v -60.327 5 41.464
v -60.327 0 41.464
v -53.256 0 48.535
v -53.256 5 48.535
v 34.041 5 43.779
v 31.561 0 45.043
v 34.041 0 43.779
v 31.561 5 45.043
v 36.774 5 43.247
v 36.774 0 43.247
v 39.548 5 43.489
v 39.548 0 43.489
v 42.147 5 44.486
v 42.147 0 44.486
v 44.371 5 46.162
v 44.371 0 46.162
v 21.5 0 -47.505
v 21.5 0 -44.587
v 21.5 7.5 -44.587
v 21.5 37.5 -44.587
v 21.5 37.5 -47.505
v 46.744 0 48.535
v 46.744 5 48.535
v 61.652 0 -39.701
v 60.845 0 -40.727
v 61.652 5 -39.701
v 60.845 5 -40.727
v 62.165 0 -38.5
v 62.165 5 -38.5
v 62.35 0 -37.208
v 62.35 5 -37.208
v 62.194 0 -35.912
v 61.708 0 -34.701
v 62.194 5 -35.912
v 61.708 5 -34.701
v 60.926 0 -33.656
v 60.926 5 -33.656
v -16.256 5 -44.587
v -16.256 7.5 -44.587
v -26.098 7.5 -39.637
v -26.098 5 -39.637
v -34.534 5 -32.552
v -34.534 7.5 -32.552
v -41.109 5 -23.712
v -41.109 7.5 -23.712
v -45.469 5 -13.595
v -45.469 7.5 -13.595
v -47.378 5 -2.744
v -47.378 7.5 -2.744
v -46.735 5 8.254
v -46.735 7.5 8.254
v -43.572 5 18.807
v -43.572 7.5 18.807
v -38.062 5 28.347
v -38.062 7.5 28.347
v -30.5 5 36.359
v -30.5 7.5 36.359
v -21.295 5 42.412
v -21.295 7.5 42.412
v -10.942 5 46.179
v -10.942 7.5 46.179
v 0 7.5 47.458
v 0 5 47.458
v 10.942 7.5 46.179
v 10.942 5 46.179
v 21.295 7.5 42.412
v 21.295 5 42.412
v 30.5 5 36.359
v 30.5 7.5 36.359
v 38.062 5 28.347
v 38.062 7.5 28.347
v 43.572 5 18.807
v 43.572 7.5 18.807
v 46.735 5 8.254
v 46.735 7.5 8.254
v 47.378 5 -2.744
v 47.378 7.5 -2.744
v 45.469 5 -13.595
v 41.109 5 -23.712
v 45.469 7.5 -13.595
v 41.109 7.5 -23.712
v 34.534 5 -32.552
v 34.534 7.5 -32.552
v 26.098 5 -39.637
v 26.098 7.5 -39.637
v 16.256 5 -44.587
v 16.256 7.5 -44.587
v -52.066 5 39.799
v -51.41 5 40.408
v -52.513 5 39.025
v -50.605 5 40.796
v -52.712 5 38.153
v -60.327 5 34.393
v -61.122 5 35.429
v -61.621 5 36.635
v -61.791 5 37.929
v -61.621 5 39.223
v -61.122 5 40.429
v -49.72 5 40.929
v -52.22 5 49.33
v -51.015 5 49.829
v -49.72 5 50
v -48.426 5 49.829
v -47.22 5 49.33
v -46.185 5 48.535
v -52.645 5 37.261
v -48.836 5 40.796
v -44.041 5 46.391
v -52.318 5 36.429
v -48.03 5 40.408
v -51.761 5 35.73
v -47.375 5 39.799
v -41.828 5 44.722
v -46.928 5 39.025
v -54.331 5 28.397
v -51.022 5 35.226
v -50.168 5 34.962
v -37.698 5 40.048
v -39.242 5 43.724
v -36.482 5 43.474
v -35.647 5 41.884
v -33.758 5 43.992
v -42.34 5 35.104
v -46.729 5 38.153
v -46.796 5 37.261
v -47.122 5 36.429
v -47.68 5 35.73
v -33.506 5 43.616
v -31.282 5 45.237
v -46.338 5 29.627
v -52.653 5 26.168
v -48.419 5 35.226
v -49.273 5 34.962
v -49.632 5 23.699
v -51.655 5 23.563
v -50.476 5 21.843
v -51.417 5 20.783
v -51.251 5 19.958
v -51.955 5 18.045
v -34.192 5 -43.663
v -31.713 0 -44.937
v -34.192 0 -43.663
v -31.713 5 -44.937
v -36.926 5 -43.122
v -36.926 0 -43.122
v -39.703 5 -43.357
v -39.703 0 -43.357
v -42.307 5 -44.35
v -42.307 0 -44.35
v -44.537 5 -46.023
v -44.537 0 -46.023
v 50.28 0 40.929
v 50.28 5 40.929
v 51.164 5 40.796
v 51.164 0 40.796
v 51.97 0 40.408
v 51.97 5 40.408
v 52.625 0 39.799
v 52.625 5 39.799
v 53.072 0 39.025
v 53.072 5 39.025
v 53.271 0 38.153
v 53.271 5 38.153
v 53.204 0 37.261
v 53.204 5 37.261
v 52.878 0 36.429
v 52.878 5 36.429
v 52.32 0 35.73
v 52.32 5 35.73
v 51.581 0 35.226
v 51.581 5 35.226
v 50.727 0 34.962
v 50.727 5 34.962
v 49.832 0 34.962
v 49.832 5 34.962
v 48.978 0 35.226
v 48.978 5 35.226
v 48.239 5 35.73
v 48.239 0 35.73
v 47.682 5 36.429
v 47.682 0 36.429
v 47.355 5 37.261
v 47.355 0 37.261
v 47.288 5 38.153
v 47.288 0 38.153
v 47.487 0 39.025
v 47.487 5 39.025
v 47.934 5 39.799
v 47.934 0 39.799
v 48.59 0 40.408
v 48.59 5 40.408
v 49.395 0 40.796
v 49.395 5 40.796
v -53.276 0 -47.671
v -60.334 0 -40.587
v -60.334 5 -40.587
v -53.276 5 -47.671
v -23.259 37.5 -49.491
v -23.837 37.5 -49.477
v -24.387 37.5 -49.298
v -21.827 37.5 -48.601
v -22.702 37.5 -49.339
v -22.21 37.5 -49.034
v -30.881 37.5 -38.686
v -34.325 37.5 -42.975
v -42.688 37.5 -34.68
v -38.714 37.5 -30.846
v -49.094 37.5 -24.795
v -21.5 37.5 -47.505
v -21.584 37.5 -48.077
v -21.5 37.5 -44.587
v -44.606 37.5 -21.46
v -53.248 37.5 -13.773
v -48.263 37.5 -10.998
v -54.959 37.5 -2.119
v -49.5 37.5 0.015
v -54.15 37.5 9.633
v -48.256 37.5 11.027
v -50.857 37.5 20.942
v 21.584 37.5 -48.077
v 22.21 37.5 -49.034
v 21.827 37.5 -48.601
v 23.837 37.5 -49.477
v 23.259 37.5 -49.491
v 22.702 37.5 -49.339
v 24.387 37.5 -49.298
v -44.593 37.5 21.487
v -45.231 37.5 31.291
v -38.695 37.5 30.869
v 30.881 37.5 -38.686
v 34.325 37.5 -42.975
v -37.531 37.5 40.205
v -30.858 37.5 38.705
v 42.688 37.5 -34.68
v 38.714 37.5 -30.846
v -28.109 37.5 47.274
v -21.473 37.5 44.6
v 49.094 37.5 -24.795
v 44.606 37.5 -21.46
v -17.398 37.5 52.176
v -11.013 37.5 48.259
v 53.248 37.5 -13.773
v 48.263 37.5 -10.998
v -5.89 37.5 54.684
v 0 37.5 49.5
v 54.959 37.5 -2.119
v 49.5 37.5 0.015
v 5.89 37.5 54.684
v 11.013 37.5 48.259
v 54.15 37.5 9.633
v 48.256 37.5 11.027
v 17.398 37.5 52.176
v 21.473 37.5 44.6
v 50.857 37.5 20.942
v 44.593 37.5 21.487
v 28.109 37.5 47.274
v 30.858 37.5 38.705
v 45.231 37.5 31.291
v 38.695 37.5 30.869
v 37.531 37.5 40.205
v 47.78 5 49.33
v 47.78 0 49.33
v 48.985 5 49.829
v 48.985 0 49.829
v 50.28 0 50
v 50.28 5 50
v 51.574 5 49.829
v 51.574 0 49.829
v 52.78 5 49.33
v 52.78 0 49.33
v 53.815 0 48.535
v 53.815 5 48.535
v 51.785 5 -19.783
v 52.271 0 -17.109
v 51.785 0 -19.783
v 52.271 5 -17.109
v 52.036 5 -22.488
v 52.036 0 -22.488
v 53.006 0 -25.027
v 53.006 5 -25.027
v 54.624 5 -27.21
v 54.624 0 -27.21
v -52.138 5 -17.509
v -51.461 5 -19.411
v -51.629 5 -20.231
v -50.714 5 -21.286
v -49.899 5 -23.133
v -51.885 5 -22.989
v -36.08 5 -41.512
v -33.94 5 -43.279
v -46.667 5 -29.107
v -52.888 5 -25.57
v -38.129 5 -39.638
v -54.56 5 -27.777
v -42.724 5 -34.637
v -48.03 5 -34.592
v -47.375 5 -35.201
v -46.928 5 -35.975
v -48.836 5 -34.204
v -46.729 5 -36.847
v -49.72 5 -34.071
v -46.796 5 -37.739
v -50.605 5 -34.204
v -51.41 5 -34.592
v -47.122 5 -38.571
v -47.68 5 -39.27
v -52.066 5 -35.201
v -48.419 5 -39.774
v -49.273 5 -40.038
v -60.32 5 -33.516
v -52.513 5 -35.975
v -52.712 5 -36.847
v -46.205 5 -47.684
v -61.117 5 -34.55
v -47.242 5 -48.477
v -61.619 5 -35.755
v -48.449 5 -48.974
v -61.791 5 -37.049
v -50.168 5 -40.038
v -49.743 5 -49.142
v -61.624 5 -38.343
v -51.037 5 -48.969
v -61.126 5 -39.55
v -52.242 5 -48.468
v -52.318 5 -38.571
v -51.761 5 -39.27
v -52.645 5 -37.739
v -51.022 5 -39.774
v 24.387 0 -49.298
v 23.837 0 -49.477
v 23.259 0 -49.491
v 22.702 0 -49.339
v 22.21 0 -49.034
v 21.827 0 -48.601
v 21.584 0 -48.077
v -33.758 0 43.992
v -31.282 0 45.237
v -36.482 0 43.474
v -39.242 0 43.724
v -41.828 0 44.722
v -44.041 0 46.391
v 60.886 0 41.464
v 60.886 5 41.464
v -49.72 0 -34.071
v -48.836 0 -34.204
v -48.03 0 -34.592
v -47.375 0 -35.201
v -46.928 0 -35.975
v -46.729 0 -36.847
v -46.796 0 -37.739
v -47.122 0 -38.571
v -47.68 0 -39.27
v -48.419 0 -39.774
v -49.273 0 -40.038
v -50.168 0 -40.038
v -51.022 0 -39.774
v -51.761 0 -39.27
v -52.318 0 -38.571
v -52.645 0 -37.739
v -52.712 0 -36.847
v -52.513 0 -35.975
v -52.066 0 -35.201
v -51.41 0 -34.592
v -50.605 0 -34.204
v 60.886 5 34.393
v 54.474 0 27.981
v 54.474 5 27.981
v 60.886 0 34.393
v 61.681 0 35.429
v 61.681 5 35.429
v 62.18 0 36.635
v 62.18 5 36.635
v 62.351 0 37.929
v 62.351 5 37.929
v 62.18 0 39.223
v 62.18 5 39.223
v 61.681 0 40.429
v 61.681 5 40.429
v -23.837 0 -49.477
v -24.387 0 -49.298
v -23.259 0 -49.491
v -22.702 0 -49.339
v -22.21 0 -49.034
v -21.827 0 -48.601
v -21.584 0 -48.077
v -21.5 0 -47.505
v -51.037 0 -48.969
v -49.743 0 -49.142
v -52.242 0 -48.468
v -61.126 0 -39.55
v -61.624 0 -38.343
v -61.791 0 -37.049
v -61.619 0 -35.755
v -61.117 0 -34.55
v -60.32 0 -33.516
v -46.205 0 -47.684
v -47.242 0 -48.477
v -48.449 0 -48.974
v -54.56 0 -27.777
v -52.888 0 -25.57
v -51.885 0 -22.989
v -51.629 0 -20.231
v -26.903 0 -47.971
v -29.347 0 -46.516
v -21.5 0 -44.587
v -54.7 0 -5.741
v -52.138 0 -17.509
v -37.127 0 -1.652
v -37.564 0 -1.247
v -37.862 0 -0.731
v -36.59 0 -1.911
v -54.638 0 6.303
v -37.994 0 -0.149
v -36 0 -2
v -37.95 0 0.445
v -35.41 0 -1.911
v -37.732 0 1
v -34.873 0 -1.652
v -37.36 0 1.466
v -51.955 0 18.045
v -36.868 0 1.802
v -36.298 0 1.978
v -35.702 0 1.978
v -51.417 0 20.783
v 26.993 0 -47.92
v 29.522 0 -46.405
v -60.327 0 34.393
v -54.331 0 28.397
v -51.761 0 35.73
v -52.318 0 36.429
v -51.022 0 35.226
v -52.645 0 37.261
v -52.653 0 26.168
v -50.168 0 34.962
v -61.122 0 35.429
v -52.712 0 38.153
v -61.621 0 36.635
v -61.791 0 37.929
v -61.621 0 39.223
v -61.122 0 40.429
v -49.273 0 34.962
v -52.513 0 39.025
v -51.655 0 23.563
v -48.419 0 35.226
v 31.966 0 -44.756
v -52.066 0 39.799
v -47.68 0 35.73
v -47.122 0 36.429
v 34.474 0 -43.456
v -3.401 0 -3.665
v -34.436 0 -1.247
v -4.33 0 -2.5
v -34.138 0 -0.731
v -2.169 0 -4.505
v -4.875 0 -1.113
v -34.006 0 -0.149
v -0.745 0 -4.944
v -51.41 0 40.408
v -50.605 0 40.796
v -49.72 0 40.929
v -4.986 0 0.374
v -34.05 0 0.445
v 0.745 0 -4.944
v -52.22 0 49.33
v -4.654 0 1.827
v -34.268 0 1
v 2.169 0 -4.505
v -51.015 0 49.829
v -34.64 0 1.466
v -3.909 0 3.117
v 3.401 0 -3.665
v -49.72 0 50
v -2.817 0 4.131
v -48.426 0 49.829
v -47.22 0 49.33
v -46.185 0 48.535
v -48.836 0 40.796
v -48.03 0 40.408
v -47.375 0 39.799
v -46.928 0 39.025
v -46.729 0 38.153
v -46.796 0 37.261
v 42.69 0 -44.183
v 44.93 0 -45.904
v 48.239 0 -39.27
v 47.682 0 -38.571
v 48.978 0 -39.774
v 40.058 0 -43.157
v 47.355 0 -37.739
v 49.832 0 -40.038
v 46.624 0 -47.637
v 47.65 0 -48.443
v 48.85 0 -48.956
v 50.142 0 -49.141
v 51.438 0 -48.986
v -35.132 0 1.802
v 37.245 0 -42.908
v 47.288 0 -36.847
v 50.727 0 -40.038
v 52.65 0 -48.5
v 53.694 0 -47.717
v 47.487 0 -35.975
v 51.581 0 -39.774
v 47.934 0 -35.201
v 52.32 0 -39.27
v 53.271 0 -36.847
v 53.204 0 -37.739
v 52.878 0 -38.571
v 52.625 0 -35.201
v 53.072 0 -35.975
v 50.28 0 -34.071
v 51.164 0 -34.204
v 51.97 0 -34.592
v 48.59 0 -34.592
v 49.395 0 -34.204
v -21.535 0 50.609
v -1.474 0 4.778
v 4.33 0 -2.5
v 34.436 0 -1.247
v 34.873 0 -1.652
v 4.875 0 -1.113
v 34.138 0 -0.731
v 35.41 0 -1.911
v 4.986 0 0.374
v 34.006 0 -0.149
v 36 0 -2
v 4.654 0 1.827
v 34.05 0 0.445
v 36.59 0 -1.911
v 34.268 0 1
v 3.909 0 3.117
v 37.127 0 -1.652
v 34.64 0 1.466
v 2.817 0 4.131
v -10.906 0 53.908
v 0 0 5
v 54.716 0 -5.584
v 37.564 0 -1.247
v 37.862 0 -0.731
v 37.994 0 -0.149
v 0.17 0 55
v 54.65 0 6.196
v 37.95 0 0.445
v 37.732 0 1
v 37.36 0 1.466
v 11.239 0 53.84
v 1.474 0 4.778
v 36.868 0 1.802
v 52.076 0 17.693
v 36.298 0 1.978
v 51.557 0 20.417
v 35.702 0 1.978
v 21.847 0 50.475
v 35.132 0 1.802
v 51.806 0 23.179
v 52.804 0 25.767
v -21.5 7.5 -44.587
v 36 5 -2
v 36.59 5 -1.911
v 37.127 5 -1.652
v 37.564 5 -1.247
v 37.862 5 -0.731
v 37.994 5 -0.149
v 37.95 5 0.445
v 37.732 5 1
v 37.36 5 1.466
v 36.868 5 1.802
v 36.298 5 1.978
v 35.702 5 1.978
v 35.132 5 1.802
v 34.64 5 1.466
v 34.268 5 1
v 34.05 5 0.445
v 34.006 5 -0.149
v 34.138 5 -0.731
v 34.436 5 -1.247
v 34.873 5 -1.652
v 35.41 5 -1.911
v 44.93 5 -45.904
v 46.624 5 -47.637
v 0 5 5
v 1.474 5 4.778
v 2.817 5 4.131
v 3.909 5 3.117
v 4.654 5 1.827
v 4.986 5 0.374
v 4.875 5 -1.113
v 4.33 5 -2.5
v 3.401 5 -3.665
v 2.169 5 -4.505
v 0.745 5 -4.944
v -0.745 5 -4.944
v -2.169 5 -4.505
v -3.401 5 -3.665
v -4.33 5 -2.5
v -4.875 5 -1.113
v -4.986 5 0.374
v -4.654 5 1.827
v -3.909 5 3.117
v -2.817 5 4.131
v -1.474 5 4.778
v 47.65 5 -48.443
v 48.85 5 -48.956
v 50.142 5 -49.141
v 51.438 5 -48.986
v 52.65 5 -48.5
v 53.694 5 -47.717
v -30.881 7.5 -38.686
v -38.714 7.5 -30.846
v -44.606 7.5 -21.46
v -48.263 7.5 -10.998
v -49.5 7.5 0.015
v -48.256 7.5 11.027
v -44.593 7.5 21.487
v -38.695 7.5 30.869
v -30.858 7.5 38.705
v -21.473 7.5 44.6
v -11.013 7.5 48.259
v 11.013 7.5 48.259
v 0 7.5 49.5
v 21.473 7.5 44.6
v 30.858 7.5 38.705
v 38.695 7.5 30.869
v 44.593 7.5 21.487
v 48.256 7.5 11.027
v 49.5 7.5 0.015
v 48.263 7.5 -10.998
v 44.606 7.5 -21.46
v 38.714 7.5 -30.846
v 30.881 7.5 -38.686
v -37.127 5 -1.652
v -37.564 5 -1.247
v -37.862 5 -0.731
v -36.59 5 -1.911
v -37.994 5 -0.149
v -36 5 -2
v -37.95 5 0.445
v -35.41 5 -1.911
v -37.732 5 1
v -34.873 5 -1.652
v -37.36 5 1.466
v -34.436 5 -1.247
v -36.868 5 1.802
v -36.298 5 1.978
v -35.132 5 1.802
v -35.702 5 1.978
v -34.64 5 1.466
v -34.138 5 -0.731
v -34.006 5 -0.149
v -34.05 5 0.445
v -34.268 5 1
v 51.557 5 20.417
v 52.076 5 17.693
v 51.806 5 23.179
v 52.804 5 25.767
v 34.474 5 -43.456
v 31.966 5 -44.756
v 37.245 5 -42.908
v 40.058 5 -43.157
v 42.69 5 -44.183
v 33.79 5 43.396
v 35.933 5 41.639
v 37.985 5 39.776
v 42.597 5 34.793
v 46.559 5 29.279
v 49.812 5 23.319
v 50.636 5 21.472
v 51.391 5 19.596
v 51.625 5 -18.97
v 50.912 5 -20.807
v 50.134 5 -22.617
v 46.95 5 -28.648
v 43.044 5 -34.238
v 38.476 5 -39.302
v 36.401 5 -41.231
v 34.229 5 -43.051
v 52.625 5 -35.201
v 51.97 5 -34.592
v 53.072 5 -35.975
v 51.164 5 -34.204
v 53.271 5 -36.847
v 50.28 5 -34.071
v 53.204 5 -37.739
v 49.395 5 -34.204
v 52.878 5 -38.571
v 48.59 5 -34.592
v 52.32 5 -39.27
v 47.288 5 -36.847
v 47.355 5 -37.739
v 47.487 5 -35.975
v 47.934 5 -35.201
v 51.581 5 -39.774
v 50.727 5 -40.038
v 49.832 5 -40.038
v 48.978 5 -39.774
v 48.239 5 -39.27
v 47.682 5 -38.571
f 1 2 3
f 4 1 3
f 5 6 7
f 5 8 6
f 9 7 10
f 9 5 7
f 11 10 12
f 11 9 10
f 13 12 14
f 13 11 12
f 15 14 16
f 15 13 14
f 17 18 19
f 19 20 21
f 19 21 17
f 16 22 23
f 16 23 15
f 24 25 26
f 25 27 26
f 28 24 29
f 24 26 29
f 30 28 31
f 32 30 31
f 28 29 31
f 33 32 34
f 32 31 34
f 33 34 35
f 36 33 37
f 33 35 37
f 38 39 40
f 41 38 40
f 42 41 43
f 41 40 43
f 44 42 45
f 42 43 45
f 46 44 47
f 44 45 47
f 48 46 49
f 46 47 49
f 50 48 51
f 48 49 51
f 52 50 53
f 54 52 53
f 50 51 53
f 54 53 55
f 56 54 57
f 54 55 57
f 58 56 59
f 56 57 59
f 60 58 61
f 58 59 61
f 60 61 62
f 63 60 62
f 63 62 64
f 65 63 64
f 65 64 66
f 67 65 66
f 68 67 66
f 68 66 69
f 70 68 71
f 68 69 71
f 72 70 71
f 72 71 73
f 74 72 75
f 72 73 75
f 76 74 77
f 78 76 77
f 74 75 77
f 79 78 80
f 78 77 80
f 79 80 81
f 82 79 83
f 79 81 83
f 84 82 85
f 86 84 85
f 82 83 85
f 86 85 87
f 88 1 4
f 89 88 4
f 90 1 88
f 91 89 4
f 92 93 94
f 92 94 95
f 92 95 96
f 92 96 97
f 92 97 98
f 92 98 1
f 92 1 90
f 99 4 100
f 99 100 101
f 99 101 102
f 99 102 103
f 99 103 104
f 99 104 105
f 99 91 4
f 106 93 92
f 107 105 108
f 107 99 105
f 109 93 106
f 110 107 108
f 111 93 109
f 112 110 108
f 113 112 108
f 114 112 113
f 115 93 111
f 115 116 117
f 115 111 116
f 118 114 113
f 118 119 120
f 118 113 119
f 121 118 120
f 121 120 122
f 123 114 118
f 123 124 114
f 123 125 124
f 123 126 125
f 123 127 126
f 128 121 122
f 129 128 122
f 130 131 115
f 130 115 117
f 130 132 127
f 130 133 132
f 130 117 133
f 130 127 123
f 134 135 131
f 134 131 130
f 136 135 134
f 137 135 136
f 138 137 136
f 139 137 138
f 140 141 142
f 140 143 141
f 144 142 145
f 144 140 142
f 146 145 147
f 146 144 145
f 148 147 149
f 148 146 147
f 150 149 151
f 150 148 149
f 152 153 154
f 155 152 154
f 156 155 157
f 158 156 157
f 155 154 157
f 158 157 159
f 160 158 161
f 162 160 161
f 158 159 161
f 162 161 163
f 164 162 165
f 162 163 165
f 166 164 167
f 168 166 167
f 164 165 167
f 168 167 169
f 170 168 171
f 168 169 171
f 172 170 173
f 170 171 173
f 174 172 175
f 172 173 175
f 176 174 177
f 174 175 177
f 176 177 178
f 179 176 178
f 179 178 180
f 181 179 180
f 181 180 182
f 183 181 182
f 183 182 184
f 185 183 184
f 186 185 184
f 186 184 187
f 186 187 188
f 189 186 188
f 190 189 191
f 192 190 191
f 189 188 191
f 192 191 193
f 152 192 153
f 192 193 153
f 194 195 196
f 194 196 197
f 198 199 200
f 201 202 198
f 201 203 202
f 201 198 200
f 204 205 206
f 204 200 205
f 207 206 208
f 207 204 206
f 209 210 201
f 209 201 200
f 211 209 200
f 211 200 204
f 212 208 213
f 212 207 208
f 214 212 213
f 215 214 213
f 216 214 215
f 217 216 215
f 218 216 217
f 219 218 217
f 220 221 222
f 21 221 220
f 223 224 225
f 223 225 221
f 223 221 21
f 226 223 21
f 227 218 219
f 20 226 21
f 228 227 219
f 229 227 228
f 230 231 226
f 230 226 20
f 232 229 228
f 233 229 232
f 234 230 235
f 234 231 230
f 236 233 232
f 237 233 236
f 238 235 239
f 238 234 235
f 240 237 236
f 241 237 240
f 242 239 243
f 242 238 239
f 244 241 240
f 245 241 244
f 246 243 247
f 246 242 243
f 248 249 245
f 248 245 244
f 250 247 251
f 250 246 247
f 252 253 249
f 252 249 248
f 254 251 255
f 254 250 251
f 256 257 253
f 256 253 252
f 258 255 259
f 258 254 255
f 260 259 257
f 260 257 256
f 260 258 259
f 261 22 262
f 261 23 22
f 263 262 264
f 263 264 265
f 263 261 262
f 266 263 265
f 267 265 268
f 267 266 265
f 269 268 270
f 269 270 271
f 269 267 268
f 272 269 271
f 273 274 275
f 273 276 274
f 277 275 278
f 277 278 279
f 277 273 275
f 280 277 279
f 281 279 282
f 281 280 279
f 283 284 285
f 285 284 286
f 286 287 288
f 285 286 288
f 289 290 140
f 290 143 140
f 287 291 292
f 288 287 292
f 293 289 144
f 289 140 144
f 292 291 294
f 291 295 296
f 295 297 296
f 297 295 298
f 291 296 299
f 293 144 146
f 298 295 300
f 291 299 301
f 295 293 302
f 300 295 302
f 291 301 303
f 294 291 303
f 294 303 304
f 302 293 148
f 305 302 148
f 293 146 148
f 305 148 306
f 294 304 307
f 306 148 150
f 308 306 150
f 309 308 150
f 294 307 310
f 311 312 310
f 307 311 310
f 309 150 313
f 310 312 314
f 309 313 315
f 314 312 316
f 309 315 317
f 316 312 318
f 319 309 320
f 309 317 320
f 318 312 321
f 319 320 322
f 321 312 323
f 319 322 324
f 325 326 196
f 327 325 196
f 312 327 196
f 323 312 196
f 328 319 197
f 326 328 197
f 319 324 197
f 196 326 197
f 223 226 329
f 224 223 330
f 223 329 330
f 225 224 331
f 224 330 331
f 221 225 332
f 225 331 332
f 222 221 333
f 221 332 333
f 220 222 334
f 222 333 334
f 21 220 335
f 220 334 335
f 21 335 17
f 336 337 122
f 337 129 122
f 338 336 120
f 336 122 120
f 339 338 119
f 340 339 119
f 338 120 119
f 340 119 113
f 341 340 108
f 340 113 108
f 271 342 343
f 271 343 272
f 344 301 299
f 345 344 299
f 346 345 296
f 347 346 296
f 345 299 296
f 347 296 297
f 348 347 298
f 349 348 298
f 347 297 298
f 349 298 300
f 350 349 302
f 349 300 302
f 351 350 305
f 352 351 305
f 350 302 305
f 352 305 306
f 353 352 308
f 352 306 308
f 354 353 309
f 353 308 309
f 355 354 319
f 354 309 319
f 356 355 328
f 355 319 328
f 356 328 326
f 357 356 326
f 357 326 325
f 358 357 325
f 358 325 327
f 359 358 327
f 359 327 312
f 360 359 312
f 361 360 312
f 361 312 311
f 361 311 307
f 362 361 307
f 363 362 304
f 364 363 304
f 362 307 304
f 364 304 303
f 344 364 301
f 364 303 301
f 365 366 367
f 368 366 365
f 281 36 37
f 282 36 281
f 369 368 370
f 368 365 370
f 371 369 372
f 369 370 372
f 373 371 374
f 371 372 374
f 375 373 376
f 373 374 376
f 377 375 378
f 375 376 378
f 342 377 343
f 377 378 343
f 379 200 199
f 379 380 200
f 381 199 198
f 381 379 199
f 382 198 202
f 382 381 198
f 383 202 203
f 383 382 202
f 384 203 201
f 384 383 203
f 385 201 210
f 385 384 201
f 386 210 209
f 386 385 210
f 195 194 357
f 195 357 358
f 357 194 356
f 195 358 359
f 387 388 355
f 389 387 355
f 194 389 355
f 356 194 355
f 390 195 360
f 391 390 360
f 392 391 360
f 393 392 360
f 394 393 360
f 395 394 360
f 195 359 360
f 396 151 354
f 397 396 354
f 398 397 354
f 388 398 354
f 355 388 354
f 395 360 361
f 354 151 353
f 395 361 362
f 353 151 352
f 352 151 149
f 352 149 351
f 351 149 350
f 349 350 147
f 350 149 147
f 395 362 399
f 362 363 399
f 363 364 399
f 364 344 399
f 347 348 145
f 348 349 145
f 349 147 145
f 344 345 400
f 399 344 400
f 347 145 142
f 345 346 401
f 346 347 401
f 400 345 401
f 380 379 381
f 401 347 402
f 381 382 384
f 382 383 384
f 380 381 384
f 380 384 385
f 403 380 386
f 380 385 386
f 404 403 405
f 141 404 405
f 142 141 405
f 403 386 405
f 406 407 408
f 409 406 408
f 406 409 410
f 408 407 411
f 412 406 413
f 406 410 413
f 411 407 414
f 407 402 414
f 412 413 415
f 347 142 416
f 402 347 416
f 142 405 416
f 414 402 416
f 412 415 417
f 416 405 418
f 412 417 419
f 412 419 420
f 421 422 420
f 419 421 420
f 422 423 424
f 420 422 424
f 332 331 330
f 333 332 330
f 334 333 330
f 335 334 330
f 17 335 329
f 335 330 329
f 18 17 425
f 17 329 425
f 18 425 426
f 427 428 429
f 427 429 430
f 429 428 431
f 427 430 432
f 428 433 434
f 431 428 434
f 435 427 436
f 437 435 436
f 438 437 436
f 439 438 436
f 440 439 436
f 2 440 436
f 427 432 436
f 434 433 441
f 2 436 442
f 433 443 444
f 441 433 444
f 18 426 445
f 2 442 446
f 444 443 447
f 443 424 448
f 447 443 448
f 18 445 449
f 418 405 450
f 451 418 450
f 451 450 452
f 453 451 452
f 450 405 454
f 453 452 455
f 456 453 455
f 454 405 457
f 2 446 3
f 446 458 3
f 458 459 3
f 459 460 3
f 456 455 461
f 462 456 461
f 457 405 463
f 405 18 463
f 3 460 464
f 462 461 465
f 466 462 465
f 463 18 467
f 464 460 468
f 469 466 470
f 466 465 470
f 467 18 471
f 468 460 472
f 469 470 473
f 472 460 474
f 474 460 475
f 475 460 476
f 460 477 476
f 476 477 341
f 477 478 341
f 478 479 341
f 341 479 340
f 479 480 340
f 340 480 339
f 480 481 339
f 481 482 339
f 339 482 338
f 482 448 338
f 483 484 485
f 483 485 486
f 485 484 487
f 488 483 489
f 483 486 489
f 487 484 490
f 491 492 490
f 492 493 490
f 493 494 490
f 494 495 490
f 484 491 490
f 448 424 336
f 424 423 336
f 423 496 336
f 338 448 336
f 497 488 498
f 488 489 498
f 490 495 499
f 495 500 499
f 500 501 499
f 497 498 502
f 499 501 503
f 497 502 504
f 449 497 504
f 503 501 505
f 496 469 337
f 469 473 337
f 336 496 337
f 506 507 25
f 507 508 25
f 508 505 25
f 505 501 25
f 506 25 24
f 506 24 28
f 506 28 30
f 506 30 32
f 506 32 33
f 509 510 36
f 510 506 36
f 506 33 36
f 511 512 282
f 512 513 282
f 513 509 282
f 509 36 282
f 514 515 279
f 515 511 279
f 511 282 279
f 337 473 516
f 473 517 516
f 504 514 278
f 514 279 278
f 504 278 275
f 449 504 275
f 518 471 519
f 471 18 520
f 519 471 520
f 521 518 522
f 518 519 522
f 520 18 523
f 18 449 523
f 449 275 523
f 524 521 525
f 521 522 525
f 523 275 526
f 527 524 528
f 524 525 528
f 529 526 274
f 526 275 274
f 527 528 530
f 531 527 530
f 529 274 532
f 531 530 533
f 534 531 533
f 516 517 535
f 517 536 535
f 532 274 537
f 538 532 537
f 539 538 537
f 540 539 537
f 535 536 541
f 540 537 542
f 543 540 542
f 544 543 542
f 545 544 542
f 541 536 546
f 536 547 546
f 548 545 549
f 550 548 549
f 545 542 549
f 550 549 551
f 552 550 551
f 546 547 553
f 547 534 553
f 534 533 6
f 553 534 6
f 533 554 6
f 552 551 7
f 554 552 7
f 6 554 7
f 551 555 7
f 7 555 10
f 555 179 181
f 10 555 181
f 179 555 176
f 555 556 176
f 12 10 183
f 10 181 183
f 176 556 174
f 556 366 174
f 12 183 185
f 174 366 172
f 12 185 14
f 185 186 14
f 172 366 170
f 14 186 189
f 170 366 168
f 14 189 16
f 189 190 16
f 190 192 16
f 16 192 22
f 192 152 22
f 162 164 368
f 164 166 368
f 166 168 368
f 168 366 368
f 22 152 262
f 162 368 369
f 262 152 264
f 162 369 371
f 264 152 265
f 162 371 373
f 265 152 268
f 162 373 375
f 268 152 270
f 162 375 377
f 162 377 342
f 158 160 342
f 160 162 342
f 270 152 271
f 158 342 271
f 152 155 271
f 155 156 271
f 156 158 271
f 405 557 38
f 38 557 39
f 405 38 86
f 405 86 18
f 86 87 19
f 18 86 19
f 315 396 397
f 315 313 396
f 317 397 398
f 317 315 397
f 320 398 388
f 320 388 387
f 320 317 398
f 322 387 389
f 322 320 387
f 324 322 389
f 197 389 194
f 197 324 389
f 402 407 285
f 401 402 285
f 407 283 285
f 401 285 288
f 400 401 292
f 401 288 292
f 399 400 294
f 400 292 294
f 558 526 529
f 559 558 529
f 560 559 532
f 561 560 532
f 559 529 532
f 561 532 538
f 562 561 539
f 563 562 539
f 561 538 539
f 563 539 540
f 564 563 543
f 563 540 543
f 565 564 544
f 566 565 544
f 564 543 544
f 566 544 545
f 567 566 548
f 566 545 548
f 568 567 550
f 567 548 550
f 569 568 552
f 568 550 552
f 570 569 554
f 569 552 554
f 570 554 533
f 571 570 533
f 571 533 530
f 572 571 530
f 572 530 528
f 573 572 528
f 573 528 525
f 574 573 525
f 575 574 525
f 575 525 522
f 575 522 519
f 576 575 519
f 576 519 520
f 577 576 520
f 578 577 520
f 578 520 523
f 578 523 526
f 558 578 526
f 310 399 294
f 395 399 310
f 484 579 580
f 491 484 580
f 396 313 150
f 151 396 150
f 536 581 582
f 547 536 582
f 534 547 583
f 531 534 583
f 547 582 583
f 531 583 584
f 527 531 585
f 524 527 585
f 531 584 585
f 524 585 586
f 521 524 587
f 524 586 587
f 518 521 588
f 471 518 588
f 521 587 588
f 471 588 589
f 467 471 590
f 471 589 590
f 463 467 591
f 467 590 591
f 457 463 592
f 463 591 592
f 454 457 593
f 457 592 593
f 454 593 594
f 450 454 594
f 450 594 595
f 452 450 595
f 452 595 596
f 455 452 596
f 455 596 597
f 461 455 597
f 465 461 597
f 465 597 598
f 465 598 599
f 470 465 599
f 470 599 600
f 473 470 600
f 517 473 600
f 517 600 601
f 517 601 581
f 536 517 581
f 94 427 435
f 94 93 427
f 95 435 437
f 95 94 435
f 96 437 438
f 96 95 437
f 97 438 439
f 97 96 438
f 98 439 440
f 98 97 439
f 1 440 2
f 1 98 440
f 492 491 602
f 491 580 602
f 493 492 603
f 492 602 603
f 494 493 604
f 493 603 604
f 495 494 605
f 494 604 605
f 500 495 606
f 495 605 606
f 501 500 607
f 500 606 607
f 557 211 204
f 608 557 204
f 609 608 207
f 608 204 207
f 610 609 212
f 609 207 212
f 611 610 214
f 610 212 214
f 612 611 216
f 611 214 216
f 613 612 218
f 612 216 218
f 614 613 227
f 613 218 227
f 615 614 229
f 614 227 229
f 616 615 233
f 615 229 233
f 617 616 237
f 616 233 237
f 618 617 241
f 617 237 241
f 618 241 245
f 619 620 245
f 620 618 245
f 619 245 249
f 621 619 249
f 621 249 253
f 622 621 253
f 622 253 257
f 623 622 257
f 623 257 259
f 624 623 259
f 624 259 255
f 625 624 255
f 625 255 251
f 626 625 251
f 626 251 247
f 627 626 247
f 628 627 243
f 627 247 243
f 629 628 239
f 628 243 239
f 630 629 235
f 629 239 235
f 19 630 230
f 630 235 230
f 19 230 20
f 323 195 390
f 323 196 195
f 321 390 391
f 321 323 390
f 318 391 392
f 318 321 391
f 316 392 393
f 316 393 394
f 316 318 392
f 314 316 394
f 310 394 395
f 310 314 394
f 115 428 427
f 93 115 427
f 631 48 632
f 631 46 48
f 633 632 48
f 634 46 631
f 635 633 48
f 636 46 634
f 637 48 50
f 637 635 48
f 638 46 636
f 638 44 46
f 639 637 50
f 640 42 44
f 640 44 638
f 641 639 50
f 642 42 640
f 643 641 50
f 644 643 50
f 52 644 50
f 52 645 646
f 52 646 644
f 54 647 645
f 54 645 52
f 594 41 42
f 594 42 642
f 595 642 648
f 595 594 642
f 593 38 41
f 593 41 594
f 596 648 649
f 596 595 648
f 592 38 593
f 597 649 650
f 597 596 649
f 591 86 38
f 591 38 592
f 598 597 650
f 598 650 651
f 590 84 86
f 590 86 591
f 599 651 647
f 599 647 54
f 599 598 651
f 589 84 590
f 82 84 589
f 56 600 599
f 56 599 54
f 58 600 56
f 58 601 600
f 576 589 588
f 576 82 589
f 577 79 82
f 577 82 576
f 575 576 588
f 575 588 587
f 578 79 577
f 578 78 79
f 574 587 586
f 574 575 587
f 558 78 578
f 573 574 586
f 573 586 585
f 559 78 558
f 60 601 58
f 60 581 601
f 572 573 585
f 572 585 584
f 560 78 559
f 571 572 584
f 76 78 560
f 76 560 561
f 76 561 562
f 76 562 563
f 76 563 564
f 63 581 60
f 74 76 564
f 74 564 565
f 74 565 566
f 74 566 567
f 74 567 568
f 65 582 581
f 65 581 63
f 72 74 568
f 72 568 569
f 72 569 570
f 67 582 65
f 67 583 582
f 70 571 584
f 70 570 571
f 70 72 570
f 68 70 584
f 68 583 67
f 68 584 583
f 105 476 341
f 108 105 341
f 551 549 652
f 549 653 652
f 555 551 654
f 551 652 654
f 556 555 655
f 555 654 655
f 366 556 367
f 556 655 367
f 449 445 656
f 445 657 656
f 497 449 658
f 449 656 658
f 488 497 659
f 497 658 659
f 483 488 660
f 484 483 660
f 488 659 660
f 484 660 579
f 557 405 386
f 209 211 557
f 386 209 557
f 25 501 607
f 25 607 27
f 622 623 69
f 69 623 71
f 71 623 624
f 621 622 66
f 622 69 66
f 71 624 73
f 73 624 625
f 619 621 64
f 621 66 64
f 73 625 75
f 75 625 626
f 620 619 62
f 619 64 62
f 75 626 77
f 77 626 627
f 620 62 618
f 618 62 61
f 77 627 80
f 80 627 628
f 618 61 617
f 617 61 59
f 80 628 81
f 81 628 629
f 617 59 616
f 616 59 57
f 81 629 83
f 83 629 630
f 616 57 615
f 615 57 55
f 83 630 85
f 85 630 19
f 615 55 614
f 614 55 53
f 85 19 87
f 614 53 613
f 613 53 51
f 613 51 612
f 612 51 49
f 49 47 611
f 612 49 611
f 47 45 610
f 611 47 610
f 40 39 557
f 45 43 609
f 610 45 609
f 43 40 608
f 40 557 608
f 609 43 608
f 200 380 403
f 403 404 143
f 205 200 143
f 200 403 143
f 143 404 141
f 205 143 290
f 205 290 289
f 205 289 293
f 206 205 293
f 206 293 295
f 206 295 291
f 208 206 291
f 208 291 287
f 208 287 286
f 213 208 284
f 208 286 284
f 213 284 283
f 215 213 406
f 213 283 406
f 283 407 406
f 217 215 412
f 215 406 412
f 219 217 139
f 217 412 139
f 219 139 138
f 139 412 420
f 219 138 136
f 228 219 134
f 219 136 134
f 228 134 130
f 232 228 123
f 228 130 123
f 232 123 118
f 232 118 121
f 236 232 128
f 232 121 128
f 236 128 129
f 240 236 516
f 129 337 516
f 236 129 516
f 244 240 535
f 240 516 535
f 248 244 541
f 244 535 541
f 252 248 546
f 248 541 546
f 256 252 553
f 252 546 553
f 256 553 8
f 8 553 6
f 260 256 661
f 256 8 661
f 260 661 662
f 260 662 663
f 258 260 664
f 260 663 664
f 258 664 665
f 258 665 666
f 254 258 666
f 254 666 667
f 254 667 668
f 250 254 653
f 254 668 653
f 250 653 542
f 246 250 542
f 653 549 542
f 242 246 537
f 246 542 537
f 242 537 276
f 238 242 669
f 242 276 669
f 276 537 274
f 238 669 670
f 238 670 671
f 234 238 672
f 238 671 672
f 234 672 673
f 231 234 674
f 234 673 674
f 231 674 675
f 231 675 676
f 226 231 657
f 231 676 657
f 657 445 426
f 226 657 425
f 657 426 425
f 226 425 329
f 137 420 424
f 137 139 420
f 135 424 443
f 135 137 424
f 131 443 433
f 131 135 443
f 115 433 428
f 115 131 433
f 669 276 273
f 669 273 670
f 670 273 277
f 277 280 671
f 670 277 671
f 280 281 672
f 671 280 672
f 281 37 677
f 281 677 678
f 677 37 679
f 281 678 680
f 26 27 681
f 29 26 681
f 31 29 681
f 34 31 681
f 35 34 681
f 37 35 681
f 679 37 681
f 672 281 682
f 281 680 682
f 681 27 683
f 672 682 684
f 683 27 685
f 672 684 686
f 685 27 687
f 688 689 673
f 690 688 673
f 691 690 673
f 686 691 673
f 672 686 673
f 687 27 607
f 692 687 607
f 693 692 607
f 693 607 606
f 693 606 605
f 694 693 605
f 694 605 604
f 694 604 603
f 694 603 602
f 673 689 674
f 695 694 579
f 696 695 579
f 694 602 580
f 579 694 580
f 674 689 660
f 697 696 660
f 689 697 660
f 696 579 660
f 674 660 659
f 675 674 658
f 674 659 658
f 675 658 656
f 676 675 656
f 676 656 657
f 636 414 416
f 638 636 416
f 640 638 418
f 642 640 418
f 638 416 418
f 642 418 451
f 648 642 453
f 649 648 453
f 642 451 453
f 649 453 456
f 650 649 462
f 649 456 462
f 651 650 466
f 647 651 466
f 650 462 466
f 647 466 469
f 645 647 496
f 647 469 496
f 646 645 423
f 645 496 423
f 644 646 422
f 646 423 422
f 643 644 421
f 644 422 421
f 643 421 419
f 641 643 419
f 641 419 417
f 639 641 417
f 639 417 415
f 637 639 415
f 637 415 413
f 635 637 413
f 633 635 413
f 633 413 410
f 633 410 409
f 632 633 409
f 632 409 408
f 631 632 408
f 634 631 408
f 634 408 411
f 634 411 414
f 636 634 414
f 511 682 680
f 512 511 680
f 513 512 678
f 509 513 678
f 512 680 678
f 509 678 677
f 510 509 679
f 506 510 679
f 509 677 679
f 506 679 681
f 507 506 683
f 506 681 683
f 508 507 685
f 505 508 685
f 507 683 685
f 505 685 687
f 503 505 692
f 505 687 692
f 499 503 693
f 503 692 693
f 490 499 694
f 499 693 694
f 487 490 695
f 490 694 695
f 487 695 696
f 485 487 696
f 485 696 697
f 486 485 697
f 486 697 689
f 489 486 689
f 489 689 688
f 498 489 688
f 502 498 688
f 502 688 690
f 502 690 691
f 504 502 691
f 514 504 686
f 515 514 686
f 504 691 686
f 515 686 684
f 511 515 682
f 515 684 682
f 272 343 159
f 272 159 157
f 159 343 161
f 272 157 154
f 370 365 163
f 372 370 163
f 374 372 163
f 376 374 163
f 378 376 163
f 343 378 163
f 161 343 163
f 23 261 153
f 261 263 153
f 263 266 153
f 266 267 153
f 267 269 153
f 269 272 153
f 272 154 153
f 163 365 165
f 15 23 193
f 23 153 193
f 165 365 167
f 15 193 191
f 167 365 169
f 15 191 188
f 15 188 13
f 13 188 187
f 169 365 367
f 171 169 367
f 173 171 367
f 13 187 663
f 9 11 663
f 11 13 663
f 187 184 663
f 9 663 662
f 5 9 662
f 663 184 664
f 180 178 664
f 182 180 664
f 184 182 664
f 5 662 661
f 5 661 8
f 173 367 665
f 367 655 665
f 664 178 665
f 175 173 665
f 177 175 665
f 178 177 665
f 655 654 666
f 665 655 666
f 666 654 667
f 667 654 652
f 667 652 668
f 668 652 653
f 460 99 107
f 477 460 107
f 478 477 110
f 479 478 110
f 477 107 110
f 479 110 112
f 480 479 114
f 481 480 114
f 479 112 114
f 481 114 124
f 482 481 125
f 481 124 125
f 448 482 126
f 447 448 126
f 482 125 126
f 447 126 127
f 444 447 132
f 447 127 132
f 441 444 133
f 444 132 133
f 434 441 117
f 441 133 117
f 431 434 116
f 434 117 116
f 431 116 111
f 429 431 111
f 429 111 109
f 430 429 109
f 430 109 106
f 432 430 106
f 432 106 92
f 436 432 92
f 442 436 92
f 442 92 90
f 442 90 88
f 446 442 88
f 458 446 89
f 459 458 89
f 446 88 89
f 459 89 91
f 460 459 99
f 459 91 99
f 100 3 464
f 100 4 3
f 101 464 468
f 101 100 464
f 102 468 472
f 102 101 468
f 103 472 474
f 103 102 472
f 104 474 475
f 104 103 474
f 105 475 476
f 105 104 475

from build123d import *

# Parameters (mm, degrees)
SKETCH_1_R          = 55
EXTRUDE_1_DEPTH     = 37.5
SKETCH_3_R          = 49.5
CUT_EXTRUDE_1_DEPTH = 32.5
SKETCH_5_W          = 43
SKETCH_5_H          = 12.242897151
CUT_EXTRUDE_2_DEPTH = 40
FILLET_4_R          = 2
FILLET_5_R          = 2
SKETCH_6_R          = 5
CUT_EXTRUDE_3_DEPTH = 12
EXTRUDE_START       = -5
EXTRUDE_3_DEPTH     = 5
FILLET_7_R          = 10
FILLET_8_R          = 5
SKETCH_10_R         = 3
CUT_EXTRUDE_5_DEPTH = 5
EXTRUDE_START_2     = 2.5
EXTRUDE_4_DEPTH     = 2.5
SKETCH_16_R         = 2
CUT_EXTRUDE_6_DEPTH = 10


with BuildPart() as part:
    # 草图1 → 凸台-拉伸1 (new body)
    with BuildSketch(Plane(origin=(0, 0, 0), x_dir=(1, 0, 0), z_dir=(0, 1, 0))):
        with Locations(Location((0, 0, 0), (0, 0, 270))):
            Circle(SKETCH_1_R)
    extrude(amount=EXTRUDE_1_DEPTH)

    # 草图3 → 切除-拉伸1 (cut)
    with BuildSketch(Plane(origin=(0, 37.5, 0), x_dir=(1, 0, 0), z_dir=(0, 1, 0))):
        with Locations(Location((0, 0, 0), (0, 0, 270))):
            Circle(SKETCH_3_R)
    extrude(amount=-CUT_EXTRUDE_1_DEPTH, mode=Mode.SUBTRACT)

    # 草图5 → 切除-拉伸2 (cut)
    with BuildSketch(Plane(origin=(0, 37.5, 0), x_dir=(1, 0, 0), z_dir=(0, 1, 0))):
        with Locations((0, 50.708442195)):
            Rectangle(SKETCH_5_W, SKETCH_5_H)
    extrude(amount=-CUT_EXTRUDE_2_DEPTH, mode=Mode.SUBTRACT)

    # 圆角4
    fillet_4_edges = [part.edges().sort_by_distance(p)[0] for p in [
        (-21.5, 18.75, -50.623611092),
    ]]
    fillet(fillet_4_edges, radius=FILLET_4_R)

    # 圆角5
    fillet_5_edges = [part.edges().sort_by_distance(p)[0] for p in [
        (21.5, 18.75, -50.623611092),
    ]]
    fillet(fillet_5_edges, radius=FILLET_5_R)

    # 草图6 → 切除-拉伸3 (cut)
    with BuildSketch(Plane(origin=(0, 5, 0), x_dir=(1, 0, 0), z_dir=(0, 1, 0))):
        with Locations(Location((0, 0, 0), (0, 0, 270))):
            Circle(SKETCH_6_R)
    extrude(amount=-CUT_EXTRUDE_3_DEPTH, mode=Mode.SUBTRACT)

    # 草图14 → 凸台-拉伸3 (add)
    with BuildSketch(Plane(origin=(0, 5, 0), x_dir=(1, 0, 0), z_dir=(0, 1, 0)).offset(EXTRUDE_START)):
        with BuildLine():
            Line((-49.898576095, 23.132922507), (-63.862525635, 37.044772973))
            Line((-63.862525635, 37.044772973), (-49.746845912, 51.213315099))
            Line((-49.746845912, 51.213315099), (-38.128637352, 39.638453724))
            ThreePointArc((-38.128637352, 39.638453724), (-44.78063998, 31.932652301), (-49.898576095, 23.132922507))
        make_face()
        with BuildLine():
            Line((49.811900188, -23.3189751), (64.421720913, -37.928795825))
            Line((64.421720913, -37.928795825), (50.279585289, -52.070931449))
            Line((50.279585289, -52.070931449), (37.984884655, -39.776230814))
            ThreePointArc((37.984884655, -39.776230814), (44.662950793, -32.097053236), (49.811900188, -23.3189751))
        make_face()
        with BuildLine():
            Line((-49.632393674, -23.698639164), (-63.862550335, -37.928795825))
            Line((-63.862550335, -37.928795825), (-49.720414711, -52.070931449))
            Line((-49.720414711, -52.070931449), (-37.697852746, -40.048369484))
            ThreePointArc((-37.697852746, -40.048369484), (-44.423770724, -32.427281642), (-49.632393674, -23.698639164))
        make_face()
        with BuildLine():
            Line((38.475737251, 39.301623923), (50.118901666, 51.212426922))
            Line((50.118901666, 51.212426922), (64.420808036, 37.231887798))
            Line((64.420808036, 37.231887798), (50.134465219, 22.6171483))
            ThreePointArc((50.134465219, 22.6171483), (45.083643676, 31.50341367), (38.475737251, 39.301623923))
        make_face()
    extrude(amount=EXTRUDE_3_DEPTH)

    # 圆角7
    fillet_7_edges = [part.edges().sort_by_distance(p)[0] for p in [
        (-38.128637352, 2.5, -39.638453724),
        (-49.898576095, 2.5, -23.132922507),
        (-49.632393674, 2.5, 23.698639164),
        (-37.697852746, 2.5, 40.048369484),
        (50.134465219, 2.5, -22.6171483),
        (38.475737251, 2.5, -39.301623923),
        (37.984884655, 2.5, 39.776230814),
        (49.811900188, 2.5, 23.3189751),
    ]]
    fillet(fillet_7_edges, radius=FILLET_7_R)

    # 圆角8
    fillet_8_edges = [part.edges().sort_by_distance(p)[0] for p in [
        (-63.862525635, 2.5, -37.044772973),
        (-49.746845912, 2.5, -51.213315099),
        (-49.720414711, 2.5, 52.070931449),
        (-63.862550335, 2.5, 37.928795825),
        (50.118901666, 2.5, -51.212426922),
        (64.420808036, 2.5, -37.231887798),
        (50.279585289, 2.5, 52.070931449),
        (64.421720913, 2.5, 37.928795825),
    ]]
    fillet(fillet_8_edges, radius=FILLET_8_R)

    # 草图10 → 切除-拉伸5 (cut)
    with BuildSketch(Plane(origin=(0, 5, 0), x_dir=(1, 0, 0), z_dir=(0, 1, 0))):
        with Locations(Location((-49.720414711, 37.071204175, 0), (0, 0, 270))):
            Circle(SKETCH_10_R)
        with Locations(Location((50.279585289, 37.071204175, 0), (0, 0, 270))):
            Circle(SKETCH_10_R)
        with Locations(Location((-49.720414711, -37.928795825, 0), (0, 0, 270))):
            Circle(SKETCH_10_R)
        with Locations(Location((50.279585289, -37.928795825, 0), (0, 0, 270))):
            Circle(SKETCH_10_R)
    extrude(amount=-CUT_EXTRUDE_5_DEPTH, mode=Mode.SUBTRACT)

    # 草图15 → 凸台-拉伸4 (add)
    with BuildSketch(Plane(origin=(0, 5, 0), x_dir=(1, 0, 0), z_dir=(0, 1, 0)).offset(EXTRUDE_START_2)):
        with BuildLine():
            Line((-21.5, 44.586993619), (-16.255768207, 44.586993619))
            ThreePointArc((-16.255768207, 44.586993619), (0, -47.457876059), (16.255768207, 44.586993619))
            Line((16.255768207, 44.586993619), (21.5, 44.586993619))
            ThreePointArc((21.5, 44.586993619), (0, -49.5), (-21.5, 44.586993619))
        make_face()
    extrude(amount=-EXTRUDE_4_DEPTH)

    # 草图16 → 切除-拉伸6 (cut)
    with BuildSketch(Plane(origin=(0, 0, 0), x_dir=(-1, 0, 0), z_dir=(0, -1, 0))):
        with Locations(Location((36, 0, 0), (0, 0, 90))):
            Circle(SKETCH_16_R)
        with Locations(Location((-36, 0, 0), (0, 0, 90))):
            Circle(SKETCH_16_R)
    extrude(amount=-CUT_EXTRUDE_6_DEPTH, mode=Mode.SUBTRACT)


solid = part.part
